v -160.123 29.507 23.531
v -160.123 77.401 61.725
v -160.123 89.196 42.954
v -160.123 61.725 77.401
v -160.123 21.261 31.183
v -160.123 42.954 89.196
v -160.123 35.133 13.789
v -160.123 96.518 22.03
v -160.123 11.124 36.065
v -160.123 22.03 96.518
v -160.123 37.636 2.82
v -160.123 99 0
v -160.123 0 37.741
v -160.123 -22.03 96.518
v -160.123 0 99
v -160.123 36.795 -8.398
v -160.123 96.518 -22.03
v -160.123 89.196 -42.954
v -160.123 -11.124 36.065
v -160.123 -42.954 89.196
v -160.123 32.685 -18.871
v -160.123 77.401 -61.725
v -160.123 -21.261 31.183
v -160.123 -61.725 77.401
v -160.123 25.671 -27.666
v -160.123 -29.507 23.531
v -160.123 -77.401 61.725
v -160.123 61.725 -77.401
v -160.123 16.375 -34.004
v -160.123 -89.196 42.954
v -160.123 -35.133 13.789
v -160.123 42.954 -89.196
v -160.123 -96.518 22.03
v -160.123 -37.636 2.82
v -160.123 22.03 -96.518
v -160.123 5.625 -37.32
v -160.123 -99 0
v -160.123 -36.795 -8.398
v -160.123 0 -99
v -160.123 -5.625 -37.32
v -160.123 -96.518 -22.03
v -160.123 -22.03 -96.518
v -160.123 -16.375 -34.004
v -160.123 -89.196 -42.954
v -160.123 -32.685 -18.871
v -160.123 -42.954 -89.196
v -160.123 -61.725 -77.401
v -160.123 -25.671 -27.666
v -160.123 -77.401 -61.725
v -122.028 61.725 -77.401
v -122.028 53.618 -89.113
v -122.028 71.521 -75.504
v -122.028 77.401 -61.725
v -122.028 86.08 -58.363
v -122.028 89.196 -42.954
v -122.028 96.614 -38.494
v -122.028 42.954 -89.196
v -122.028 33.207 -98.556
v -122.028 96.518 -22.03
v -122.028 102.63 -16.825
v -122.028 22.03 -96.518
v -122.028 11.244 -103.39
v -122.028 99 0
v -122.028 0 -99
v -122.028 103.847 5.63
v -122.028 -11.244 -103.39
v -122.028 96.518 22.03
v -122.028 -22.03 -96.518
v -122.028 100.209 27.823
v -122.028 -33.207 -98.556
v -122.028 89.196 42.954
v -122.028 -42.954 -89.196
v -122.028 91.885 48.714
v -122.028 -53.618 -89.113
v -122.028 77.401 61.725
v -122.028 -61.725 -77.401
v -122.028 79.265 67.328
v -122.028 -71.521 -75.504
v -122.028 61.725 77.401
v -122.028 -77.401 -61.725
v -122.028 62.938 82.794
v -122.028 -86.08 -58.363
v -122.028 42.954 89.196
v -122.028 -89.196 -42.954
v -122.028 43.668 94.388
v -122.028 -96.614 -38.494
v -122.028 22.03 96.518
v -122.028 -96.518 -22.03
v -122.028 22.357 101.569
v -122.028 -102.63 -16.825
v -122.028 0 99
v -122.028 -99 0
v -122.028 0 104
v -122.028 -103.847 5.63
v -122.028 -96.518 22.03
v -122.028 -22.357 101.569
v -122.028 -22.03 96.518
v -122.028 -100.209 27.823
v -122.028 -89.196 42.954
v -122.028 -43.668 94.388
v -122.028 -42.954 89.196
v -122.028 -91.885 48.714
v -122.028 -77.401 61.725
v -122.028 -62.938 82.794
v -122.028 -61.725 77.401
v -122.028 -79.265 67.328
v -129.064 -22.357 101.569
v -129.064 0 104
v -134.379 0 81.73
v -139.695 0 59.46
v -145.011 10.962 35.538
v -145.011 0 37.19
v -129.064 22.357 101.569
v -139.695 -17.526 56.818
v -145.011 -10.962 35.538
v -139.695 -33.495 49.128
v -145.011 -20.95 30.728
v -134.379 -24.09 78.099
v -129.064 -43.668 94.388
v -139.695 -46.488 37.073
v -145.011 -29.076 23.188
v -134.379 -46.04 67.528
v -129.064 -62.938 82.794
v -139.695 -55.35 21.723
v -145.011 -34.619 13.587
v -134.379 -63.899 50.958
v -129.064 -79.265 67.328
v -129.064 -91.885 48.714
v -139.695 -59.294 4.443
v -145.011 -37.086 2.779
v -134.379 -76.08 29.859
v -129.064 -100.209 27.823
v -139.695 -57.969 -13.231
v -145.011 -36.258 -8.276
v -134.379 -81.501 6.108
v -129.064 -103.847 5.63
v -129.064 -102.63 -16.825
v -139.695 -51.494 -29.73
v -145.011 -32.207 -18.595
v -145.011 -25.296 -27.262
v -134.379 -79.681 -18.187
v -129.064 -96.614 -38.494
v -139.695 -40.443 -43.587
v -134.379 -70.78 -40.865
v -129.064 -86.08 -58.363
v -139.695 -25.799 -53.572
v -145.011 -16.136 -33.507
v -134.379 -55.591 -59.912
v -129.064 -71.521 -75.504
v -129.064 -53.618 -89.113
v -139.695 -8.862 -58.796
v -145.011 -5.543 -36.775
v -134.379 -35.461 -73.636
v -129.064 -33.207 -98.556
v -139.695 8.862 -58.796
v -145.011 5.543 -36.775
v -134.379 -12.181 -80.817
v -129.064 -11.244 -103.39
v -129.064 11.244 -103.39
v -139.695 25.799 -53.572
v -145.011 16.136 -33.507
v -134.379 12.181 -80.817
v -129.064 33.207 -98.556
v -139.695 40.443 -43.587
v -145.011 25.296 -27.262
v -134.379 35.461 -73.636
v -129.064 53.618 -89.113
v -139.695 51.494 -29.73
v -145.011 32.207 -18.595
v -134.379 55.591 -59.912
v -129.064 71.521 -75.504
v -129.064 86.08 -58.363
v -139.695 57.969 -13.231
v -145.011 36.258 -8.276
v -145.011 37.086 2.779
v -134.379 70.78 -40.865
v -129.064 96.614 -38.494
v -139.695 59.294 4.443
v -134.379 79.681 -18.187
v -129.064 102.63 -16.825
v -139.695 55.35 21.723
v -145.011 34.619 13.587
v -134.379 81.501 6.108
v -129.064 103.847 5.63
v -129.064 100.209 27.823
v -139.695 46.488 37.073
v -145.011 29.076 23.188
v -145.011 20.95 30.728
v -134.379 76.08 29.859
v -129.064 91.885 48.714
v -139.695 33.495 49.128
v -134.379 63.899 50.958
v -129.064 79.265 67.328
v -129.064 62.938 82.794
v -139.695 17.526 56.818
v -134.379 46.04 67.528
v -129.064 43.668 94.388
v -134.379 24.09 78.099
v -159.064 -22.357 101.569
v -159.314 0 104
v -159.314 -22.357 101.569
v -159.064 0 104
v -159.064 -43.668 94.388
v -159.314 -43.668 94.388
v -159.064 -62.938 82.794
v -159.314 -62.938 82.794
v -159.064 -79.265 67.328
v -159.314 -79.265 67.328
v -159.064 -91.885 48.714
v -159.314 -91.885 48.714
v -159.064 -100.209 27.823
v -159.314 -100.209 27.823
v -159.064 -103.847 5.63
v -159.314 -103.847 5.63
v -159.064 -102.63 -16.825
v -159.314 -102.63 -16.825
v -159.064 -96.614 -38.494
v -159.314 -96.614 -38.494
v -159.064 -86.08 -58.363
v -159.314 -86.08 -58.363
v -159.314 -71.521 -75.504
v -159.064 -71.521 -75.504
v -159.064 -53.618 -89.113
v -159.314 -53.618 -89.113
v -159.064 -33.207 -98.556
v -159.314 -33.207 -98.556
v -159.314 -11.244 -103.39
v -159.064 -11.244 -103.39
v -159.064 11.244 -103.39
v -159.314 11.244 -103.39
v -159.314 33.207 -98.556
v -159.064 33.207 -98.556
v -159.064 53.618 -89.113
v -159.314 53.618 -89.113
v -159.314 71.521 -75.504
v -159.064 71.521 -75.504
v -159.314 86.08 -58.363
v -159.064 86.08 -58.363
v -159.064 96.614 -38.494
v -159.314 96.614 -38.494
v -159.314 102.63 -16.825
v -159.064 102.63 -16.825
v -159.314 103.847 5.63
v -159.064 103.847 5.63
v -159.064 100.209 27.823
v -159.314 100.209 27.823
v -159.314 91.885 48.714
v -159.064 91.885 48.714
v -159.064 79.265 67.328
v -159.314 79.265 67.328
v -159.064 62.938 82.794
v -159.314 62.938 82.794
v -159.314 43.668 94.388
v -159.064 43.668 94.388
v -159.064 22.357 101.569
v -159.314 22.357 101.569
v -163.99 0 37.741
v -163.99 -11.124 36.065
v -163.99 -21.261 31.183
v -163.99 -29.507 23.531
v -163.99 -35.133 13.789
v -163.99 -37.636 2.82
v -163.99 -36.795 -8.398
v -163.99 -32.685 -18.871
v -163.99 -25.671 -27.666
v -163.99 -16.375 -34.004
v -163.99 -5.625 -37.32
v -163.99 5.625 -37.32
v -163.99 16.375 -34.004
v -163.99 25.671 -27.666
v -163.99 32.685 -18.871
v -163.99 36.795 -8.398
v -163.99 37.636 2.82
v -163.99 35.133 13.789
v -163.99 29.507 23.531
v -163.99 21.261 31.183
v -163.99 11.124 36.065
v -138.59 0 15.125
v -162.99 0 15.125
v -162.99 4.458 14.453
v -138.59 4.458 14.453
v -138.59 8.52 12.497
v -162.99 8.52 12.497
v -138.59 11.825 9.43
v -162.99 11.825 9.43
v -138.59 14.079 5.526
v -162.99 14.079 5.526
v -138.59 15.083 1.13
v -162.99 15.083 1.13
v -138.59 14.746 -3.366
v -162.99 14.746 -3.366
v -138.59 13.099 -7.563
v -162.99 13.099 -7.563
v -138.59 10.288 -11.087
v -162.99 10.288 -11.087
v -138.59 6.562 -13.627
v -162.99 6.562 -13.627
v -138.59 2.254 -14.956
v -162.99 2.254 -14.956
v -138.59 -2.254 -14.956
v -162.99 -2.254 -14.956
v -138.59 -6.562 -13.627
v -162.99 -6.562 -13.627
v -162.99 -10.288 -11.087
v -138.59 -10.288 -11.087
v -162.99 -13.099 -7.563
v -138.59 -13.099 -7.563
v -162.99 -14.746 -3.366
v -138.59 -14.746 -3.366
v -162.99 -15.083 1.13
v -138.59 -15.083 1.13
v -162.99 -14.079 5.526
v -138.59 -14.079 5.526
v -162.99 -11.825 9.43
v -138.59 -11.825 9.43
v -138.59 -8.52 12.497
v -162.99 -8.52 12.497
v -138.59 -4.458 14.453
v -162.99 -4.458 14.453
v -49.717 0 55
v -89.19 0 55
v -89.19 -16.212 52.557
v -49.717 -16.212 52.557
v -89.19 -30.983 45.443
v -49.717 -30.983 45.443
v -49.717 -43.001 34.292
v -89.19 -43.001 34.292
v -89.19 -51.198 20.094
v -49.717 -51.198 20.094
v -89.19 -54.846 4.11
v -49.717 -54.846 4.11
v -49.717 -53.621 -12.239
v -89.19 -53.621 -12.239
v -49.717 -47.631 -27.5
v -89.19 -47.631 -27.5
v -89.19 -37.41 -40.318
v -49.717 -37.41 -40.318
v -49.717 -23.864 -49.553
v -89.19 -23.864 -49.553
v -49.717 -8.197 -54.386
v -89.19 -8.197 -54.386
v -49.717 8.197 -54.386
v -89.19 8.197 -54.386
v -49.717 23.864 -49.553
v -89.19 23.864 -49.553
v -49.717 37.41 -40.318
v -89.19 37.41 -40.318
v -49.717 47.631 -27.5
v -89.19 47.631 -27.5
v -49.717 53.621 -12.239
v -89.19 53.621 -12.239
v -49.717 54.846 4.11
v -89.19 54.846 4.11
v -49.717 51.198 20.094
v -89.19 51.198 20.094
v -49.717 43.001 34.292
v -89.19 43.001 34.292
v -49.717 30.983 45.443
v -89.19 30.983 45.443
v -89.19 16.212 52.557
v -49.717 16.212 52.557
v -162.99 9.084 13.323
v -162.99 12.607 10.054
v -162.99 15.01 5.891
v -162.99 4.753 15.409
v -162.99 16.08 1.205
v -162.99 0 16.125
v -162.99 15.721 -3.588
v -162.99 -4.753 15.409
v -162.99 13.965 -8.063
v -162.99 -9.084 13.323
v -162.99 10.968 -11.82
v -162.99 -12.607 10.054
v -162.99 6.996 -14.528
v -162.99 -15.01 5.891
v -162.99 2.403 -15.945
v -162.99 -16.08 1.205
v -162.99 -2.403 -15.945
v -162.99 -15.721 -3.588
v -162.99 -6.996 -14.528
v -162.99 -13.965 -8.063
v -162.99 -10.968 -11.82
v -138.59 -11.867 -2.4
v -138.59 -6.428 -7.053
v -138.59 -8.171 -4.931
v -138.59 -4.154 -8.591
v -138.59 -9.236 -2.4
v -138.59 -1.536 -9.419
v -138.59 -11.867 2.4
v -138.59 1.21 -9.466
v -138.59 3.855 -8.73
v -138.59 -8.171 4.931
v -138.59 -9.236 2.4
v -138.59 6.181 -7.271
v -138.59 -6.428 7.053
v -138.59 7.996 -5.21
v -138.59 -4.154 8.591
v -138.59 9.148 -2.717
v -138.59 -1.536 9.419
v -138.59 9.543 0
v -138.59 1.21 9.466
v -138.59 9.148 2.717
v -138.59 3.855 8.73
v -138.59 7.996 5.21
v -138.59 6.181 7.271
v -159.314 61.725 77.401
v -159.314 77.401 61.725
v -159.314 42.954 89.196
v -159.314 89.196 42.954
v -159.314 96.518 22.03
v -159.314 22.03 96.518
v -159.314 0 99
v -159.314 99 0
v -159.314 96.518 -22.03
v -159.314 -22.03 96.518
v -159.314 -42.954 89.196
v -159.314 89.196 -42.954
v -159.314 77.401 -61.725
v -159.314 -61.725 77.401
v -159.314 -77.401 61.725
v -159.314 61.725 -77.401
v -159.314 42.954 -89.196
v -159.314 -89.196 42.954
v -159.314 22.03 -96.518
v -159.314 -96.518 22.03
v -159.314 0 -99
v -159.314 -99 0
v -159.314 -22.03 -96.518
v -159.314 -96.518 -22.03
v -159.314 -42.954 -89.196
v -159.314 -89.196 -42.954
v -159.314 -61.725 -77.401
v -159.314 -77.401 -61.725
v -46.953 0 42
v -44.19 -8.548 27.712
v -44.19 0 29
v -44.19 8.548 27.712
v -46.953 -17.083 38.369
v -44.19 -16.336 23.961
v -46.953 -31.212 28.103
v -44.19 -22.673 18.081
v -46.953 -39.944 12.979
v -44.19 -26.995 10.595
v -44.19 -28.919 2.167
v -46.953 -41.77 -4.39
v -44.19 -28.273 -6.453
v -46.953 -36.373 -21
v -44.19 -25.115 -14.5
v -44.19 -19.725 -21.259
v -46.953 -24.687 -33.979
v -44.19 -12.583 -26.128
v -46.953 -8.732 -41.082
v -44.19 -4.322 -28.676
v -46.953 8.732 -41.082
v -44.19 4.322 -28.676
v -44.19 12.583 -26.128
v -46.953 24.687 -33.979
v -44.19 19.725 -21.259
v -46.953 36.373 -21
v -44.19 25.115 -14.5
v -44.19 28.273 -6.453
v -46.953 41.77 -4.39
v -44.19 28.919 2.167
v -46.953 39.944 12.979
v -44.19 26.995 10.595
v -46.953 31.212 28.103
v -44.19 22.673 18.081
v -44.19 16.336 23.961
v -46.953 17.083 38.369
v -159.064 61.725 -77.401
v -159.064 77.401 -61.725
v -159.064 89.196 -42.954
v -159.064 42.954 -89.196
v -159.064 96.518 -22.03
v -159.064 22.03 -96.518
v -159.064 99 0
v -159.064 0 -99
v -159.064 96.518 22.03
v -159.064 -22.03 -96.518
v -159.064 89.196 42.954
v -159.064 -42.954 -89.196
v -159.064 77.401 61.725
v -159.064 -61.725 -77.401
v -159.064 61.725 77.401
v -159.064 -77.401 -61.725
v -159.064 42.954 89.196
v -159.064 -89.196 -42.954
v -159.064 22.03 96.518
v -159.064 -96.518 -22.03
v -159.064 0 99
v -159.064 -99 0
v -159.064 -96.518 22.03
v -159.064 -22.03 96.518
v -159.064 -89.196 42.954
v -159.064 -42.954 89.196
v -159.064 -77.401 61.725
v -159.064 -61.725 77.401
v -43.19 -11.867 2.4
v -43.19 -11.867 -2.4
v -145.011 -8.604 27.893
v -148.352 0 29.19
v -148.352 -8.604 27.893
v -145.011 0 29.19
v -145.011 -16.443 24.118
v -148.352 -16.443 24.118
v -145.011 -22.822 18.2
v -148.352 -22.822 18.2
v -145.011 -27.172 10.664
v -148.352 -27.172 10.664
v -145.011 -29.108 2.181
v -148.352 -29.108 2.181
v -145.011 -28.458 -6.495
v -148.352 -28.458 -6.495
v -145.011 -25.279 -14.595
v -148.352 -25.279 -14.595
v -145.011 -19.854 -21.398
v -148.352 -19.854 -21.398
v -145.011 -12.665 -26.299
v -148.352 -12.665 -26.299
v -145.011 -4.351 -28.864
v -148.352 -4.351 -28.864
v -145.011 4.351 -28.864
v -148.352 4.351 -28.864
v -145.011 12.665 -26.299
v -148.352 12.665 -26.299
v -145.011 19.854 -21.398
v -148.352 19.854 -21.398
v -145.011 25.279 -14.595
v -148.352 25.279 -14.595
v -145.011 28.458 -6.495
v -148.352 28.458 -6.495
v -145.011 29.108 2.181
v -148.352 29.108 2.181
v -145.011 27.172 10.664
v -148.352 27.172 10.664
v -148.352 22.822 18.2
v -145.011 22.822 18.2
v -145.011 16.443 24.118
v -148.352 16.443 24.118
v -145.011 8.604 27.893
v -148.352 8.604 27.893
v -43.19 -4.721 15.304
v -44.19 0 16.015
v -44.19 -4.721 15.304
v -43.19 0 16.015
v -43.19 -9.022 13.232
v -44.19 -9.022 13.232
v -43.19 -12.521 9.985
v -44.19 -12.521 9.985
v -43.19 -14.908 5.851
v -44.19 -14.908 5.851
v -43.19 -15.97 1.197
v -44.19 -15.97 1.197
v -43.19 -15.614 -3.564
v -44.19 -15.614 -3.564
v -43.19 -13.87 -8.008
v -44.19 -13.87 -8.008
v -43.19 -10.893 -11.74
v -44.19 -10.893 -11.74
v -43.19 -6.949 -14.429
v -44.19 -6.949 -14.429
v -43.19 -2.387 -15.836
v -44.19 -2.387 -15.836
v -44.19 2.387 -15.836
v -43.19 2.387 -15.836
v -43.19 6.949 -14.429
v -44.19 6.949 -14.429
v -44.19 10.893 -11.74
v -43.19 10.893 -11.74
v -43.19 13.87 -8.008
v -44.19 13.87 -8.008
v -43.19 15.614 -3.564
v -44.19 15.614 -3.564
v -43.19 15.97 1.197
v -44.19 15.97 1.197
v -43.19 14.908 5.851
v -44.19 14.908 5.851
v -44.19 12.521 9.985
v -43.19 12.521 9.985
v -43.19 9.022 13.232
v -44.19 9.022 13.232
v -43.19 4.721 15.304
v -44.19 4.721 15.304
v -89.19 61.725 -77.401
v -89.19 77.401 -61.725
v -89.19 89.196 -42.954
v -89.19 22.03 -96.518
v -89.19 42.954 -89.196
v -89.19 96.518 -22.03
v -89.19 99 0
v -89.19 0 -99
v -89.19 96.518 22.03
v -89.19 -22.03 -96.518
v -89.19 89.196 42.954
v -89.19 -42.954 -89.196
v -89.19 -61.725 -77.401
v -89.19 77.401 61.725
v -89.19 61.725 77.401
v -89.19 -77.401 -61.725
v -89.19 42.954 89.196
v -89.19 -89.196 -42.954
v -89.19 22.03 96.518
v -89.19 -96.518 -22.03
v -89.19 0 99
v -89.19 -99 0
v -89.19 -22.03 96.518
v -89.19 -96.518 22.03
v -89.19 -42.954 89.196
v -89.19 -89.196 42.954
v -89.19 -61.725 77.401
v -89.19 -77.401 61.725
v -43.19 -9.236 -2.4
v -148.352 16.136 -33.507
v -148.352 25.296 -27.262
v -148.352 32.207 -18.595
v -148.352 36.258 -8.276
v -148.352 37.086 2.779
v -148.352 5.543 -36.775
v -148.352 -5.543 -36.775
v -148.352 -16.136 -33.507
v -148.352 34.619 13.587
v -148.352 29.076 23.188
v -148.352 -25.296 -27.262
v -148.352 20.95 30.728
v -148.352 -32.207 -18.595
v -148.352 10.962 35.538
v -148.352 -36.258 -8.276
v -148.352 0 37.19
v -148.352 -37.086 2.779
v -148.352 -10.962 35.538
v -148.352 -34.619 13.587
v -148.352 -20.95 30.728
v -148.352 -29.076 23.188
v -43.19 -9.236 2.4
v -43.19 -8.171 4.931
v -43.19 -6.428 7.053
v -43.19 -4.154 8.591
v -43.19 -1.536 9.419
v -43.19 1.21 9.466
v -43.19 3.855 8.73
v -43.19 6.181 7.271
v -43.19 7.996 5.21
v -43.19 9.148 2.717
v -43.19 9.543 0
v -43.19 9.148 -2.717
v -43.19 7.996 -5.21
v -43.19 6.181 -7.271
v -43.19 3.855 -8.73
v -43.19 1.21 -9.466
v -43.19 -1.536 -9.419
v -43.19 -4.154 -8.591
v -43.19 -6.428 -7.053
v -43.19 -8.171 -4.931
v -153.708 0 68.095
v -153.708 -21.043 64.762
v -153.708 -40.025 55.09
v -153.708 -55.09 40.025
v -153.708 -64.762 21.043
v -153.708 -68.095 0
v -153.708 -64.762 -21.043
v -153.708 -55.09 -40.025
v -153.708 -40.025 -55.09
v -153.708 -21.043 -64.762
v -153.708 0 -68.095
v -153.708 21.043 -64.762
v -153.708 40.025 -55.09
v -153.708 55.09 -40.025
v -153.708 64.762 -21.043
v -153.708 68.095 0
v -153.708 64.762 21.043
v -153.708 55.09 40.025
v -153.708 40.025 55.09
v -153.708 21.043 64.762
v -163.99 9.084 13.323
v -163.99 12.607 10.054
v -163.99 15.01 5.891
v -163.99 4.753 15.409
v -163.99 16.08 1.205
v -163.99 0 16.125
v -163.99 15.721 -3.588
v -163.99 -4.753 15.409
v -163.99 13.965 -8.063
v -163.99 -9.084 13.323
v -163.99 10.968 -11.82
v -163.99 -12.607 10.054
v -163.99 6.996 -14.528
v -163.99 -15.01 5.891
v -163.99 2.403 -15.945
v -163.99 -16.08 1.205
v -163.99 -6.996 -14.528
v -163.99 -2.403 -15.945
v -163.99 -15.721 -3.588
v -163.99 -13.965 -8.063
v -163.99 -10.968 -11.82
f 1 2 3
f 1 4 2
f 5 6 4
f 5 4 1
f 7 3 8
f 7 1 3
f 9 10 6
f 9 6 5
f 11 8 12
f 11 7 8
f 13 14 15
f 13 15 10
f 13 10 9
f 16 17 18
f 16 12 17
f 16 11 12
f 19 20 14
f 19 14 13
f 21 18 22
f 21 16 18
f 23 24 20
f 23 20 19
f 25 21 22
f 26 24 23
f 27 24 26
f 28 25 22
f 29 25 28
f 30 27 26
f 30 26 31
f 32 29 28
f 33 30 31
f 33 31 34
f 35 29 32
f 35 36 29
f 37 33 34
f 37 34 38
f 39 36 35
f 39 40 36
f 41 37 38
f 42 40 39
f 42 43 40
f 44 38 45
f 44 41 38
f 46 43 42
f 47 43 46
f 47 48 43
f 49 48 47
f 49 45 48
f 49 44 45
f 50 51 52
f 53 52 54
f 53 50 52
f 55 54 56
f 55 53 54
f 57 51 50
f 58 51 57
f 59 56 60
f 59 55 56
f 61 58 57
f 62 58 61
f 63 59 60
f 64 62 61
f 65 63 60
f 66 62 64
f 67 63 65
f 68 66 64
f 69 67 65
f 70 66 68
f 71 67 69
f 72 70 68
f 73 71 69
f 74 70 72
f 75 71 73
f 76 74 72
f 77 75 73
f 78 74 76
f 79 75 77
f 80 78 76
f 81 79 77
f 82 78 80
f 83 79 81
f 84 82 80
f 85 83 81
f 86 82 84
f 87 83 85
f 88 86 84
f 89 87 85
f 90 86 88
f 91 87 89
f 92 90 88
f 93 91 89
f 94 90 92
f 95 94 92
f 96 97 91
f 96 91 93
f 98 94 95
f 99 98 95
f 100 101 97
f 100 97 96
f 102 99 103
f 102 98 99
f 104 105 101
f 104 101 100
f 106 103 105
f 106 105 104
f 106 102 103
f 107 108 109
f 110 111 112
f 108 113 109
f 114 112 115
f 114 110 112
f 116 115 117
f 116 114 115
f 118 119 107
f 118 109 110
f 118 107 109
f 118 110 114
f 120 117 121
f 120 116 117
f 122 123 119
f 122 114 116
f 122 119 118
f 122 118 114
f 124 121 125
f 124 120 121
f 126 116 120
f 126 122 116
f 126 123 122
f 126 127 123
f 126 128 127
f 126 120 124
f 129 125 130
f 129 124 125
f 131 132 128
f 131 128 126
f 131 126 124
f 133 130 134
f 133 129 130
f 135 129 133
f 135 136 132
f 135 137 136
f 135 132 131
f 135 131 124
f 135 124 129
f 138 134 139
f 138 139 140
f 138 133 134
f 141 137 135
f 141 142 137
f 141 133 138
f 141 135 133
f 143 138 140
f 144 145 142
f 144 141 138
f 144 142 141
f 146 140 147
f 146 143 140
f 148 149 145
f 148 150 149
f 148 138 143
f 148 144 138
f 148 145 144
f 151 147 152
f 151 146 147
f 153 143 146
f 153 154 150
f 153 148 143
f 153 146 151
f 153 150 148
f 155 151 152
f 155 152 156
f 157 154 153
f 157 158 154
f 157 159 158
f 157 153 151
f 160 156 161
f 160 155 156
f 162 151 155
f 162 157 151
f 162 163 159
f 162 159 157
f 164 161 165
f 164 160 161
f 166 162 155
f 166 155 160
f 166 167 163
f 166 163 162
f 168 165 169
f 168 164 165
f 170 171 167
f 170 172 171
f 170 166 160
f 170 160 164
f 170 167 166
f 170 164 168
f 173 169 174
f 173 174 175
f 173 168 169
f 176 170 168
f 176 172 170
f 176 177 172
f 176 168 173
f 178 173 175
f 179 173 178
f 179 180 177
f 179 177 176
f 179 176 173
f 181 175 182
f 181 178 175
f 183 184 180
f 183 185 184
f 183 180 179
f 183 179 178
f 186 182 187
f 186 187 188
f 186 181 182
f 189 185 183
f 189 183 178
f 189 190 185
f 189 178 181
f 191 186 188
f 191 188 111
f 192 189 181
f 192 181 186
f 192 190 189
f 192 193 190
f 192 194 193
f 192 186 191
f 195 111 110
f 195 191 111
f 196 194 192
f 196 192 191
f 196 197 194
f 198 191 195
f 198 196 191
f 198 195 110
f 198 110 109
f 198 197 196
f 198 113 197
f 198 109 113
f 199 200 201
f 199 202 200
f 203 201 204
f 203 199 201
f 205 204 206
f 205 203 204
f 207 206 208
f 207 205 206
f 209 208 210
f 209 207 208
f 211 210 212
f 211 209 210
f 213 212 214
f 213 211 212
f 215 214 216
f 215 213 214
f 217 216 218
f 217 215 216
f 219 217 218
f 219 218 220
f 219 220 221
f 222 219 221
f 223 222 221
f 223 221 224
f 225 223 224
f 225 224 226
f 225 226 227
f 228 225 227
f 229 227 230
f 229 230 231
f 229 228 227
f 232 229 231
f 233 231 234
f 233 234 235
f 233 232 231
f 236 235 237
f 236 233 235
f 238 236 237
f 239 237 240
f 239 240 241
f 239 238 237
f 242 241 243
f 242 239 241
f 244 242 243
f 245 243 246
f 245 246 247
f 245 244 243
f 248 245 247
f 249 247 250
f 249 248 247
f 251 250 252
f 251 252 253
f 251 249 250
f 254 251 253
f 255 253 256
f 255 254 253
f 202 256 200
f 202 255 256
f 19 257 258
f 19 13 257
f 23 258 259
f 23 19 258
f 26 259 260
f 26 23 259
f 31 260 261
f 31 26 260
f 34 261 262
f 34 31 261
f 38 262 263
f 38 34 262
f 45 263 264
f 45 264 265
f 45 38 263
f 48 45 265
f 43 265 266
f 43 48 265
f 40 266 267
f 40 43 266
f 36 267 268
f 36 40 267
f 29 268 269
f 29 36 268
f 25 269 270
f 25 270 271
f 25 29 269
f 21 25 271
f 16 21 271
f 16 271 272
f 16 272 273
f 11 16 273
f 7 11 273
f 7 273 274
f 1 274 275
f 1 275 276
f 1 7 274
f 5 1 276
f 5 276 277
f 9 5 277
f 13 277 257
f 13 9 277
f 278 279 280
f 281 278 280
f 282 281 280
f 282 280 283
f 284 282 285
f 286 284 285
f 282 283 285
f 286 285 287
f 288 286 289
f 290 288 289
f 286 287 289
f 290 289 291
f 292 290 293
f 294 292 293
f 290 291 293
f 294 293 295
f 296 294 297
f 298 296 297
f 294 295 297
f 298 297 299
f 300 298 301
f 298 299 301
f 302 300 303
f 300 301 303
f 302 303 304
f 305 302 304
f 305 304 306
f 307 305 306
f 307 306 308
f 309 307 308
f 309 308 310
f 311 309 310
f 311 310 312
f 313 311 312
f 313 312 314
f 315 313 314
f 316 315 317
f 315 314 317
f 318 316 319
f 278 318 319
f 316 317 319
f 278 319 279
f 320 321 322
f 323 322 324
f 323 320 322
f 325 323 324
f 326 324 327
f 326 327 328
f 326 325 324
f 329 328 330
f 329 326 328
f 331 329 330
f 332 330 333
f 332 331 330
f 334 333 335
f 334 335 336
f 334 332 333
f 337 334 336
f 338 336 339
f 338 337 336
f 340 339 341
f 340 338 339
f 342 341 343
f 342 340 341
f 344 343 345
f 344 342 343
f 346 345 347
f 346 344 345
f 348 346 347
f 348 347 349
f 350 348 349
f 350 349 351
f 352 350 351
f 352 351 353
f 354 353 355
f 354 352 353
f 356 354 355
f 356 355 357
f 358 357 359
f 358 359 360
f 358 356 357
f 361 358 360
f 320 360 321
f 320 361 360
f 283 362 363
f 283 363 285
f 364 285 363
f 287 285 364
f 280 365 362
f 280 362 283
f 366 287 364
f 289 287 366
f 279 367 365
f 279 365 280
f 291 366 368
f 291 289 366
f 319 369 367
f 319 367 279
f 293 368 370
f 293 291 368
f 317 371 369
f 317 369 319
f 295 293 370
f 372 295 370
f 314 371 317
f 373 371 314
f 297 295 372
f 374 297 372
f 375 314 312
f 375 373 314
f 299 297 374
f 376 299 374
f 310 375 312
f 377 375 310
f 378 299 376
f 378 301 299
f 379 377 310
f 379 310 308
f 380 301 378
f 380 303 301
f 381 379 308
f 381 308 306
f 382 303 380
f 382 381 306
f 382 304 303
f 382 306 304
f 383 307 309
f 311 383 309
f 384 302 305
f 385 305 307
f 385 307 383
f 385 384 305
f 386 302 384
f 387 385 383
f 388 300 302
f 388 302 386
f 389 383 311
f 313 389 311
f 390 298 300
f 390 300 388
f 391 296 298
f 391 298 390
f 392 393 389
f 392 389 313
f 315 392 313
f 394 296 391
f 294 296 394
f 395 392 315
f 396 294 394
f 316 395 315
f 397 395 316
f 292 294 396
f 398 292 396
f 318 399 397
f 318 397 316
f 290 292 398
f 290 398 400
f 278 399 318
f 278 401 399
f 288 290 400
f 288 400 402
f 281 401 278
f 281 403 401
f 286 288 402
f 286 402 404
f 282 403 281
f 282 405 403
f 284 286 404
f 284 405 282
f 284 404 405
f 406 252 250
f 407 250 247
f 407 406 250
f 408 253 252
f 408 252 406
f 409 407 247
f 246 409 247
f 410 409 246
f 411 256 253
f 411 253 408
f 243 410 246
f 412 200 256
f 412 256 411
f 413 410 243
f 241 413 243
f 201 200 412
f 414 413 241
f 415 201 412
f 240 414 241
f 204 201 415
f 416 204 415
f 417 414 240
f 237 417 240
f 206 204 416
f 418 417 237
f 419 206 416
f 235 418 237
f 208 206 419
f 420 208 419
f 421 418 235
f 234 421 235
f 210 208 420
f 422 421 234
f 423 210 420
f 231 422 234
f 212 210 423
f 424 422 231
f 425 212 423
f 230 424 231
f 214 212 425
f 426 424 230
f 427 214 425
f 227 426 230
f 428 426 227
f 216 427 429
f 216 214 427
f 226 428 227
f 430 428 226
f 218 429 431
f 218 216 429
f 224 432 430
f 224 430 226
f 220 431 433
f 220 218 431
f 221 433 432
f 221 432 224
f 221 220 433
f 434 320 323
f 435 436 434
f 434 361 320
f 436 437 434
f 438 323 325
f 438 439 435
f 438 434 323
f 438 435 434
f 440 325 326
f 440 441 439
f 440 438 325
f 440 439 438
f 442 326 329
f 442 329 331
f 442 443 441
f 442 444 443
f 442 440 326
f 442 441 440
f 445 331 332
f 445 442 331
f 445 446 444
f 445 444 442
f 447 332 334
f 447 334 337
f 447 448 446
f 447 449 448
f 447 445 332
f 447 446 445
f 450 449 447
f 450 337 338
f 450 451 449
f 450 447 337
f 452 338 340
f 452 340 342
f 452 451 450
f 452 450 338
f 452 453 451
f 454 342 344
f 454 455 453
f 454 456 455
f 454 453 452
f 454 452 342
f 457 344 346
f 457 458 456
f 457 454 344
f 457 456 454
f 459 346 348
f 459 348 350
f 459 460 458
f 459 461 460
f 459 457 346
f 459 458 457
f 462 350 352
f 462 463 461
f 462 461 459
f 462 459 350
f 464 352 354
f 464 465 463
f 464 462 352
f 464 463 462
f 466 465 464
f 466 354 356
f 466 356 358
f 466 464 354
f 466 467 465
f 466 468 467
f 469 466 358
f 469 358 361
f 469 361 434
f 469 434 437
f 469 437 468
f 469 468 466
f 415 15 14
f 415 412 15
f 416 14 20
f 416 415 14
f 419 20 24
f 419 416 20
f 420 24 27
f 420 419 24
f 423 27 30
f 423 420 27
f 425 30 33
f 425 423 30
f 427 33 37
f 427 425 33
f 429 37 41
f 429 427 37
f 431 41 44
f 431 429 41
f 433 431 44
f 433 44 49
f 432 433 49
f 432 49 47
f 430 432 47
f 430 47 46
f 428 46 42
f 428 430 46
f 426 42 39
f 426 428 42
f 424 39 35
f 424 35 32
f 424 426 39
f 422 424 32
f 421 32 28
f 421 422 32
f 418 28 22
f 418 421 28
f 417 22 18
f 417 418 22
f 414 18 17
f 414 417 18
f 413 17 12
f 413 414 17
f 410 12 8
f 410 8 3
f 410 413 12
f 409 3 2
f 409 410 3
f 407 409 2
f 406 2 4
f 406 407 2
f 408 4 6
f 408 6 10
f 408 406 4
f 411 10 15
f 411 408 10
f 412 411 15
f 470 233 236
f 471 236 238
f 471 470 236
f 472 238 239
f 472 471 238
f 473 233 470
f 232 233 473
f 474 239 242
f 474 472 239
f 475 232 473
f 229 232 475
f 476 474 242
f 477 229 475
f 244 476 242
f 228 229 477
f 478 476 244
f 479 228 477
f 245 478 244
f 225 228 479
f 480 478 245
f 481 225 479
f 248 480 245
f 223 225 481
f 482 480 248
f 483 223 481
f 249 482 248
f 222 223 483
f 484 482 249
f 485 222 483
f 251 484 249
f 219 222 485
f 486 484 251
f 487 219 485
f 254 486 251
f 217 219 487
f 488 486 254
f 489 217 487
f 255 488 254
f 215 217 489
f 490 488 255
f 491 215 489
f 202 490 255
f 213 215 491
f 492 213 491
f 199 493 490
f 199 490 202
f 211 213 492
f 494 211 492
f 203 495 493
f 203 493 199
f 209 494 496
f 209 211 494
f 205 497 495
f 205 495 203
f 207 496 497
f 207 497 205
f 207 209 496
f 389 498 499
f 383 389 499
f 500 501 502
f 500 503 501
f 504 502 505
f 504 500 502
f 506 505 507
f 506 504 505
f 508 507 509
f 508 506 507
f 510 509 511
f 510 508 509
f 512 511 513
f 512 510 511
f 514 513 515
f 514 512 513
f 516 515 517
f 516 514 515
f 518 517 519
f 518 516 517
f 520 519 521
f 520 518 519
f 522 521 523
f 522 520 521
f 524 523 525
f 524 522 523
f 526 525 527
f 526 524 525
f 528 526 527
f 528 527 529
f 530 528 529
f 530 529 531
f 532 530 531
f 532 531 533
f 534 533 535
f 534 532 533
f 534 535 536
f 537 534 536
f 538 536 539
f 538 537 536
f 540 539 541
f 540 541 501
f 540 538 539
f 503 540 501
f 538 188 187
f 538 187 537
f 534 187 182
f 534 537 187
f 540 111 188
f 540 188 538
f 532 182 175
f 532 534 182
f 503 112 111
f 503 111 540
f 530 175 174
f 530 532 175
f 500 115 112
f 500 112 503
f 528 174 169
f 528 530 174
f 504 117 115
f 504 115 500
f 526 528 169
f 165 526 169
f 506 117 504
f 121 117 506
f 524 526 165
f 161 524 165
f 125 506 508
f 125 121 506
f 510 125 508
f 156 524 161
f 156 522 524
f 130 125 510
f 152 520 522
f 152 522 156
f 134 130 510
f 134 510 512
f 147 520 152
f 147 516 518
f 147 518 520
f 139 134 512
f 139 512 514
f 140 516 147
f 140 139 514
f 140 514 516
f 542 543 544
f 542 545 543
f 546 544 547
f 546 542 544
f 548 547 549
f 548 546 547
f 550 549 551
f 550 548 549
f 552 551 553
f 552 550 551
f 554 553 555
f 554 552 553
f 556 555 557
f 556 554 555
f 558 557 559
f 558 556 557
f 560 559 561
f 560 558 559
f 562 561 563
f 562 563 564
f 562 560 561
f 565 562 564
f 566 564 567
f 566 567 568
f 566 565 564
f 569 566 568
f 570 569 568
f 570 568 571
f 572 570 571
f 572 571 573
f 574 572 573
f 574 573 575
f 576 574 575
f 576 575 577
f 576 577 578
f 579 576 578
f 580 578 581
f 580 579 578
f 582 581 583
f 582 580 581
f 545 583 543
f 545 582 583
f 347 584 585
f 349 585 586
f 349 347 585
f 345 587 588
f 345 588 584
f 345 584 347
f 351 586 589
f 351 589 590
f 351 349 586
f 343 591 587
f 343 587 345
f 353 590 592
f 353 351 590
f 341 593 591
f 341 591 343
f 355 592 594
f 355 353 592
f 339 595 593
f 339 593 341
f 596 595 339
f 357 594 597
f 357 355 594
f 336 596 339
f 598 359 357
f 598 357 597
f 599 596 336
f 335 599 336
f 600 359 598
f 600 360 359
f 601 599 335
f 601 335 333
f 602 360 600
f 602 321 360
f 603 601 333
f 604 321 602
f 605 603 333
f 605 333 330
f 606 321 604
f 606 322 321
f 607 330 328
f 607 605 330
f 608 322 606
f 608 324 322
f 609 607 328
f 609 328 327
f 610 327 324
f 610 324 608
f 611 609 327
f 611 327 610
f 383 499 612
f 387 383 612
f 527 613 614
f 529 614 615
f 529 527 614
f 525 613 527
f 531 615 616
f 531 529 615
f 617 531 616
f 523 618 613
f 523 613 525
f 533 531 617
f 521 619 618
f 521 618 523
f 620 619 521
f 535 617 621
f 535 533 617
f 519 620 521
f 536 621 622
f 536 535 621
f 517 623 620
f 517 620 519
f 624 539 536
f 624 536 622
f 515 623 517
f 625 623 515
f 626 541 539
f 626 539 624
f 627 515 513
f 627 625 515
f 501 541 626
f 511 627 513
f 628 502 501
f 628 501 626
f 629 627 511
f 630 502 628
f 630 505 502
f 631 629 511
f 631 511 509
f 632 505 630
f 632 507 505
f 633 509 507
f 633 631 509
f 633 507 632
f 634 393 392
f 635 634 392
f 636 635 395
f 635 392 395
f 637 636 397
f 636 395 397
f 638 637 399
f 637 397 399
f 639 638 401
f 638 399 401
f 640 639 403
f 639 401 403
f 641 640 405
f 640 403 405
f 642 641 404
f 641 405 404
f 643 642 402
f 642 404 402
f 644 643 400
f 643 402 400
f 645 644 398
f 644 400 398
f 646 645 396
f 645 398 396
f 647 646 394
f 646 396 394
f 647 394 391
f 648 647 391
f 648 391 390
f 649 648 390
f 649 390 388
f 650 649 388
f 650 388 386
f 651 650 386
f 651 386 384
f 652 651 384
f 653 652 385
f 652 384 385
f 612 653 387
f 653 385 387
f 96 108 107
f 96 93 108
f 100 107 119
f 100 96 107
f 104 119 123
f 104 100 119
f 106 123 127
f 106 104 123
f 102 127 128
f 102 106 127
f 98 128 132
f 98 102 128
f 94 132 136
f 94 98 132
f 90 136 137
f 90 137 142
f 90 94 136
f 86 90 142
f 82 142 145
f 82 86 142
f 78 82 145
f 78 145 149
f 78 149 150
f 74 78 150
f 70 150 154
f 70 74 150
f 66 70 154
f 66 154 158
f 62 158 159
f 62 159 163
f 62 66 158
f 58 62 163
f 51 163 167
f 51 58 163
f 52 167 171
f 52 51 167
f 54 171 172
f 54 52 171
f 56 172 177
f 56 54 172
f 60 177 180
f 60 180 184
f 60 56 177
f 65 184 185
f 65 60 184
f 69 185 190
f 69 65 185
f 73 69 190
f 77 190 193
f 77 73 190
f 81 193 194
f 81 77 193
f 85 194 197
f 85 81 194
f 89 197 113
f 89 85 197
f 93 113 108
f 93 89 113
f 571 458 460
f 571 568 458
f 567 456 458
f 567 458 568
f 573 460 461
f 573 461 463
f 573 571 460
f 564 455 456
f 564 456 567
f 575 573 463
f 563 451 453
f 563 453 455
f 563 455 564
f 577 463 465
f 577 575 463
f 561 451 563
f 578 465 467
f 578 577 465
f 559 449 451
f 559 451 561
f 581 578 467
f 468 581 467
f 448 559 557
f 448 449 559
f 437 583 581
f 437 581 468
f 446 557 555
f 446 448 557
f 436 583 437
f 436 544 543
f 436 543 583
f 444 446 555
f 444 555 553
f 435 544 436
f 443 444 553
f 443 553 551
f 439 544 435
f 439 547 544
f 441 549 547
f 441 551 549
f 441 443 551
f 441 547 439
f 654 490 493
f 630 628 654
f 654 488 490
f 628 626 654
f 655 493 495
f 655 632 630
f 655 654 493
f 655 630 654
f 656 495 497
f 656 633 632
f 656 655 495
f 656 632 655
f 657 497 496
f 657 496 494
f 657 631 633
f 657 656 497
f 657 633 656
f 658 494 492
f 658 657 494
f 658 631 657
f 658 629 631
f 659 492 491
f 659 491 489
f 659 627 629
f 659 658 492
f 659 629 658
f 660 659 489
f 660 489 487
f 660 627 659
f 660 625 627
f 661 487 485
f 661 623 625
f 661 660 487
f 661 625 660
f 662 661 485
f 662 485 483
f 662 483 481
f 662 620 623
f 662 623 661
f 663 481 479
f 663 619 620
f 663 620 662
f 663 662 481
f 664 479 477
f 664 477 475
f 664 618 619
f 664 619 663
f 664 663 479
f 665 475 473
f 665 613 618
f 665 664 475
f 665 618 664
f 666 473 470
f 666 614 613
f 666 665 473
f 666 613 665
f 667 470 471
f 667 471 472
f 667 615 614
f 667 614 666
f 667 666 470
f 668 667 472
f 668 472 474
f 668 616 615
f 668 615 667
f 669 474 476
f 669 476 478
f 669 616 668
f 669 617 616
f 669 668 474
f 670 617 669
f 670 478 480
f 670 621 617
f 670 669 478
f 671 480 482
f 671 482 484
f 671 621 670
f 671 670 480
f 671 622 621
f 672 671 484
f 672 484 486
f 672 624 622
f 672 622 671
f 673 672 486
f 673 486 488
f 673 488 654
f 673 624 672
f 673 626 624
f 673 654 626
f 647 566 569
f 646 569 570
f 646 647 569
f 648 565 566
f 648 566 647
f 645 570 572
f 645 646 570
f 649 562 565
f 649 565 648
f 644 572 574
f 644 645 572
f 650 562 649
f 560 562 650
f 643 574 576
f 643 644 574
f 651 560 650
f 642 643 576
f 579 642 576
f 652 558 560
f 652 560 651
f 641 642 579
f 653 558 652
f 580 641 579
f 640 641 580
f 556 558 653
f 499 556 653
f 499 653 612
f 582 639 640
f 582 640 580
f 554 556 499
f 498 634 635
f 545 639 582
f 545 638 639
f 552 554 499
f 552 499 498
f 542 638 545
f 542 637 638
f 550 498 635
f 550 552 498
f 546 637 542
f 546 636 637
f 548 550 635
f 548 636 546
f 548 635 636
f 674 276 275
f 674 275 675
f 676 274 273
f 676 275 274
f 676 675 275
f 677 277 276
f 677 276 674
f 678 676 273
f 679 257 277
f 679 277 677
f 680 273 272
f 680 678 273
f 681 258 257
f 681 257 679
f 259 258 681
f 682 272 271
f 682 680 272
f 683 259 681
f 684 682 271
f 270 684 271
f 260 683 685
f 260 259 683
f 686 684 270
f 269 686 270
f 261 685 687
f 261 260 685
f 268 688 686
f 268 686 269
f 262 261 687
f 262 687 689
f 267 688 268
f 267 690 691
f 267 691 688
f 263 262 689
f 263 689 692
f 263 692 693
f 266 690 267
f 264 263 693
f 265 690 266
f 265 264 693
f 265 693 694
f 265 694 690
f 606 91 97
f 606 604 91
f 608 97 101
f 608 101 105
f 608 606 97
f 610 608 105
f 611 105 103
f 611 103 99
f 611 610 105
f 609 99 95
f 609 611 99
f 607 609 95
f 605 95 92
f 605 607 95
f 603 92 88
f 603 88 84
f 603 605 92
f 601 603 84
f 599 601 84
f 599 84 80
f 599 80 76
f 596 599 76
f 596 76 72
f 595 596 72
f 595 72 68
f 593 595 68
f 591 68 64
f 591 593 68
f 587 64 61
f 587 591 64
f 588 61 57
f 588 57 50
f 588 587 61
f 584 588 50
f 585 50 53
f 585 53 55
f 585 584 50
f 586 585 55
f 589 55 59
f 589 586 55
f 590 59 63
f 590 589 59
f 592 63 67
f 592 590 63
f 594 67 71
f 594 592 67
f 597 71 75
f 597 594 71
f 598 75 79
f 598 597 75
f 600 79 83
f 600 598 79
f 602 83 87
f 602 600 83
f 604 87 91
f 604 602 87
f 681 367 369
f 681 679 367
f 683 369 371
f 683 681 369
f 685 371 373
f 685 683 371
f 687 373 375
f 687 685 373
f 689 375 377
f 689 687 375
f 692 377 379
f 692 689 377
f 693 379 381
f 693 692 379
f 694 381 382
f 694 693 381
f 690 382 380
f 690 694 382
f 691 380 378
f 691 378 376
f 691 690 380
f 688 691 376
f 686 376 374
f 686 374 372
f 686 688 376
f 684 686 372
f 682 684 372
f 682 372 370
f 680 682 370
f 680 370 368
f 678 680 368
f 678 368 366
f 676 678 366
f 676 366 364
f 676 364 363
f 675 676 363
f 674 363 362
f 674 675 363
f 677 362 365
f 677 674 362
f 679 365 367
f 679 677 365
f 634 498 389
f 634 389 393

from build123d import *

# Parameters (mm, degrees)
SKETCH2_R          = 15.125
CUT_EXTRUDE5_DEPTH = 24.4
CUT_EXTRUDE6_REACH = 177.309
SKETCH3_R          = 9.543
CUT_EXTRUDE7_REACH = 192.328
SKETCH4_W          = 4.8
SKETCH4_H          = 4.648


with BuildPart() as part:
    # Sketch1 → Revolve1 (revolve)
    with BuildSketch(Plane.XY, mode=Mode.PRIVATE) as revolve1_sk:
        Polygon((-162.990125159, 0), (-162.990125159, 16.125), (-163.990125159, 16.125), (-163.990125159, 37.741454009), (-160.123125159, 37.741454009), (-160.123125159, 99), (-159.313606376, 99), (-159.313606376, 104), (-159.063606376, 104), (-159.063606376, 99), (-148.352353258, 37.189964302), (-148.352353258, 29.189964302), (-145.01123533, 29.189964302), (-145.01123533, 37.189964302), (-129.063606376, 104), (-122.028125159, 104), (-122.028125159, 99), (-89.190125159, 99), (-89.190125159, 55), (-49.716595762, 55), (-44.190125159, 29), (-44.190125159, 16.015195652), (-43.190125159, 16.015195652), (-43.190125159, 0), align=None)
    revolve(revolve1_sk.sketch.rotate(Axis((-162.990125159, 0, 0), (1, 0, 0)), 90), axis=Axis((-162.990125159, 0, 0), (1, 0, 0)))

    # Sketch2 → Cut-Extrude5 (cut)
    with BuildSketch(Plane.ZY.offset(162.990125159)):
        Circle(SKETCH2_R)
    extrude(amount=-CUT_EXTRUDE5_DEPTH, mode=Mode.SUBTRACT)

    # Sketch3 → Cut-Extrude6 (cut, up to next)
    with BuildSketch(Plane.ZY.offset(138.590125159), mode=Mode.PRIVATE) as cut_extrude6_sk1:
        Circle(SKETCH3_R)
    cut_extrude6_tool1 = extrude(cut_extrude6_sk1.sketch, amount=-CUT_EXTRUDE6_REACH, mode=Mode.PRIVATE) & part.part
    add(cut_extrude6_tool1.solids().sort_by_distance((-138.590125, 0, 0))[0], mode=Mode.SUBTRACT)

    # Sketch4 → Cut-Extrude7 (cut, up to next)
    with BuildSketch(Plane(origin=(-43.190125159, 0, 0), x_dir=(0, 0, -1), z_dir=(1, 0, 0)), mode=Mode.PRIVATE) as cut_extrude7_sk1:
        with Locations((0, -9.543)):
            Rectangle(SKETCH4_W, SKETCH4_H)
    cut_extrude7_tool1 = extrude(cut_extrude7_sk1.sketch, amount=-CUT_EXTRUDE7_REACH, mode=Mode.PRIVATE) & part.part
    add(cut_extrude7_tool1.solids().sort_by_distance((-43.190125, -9.543, 0))[0], mode=Mode.SUBTRACT)


solid = part.part
